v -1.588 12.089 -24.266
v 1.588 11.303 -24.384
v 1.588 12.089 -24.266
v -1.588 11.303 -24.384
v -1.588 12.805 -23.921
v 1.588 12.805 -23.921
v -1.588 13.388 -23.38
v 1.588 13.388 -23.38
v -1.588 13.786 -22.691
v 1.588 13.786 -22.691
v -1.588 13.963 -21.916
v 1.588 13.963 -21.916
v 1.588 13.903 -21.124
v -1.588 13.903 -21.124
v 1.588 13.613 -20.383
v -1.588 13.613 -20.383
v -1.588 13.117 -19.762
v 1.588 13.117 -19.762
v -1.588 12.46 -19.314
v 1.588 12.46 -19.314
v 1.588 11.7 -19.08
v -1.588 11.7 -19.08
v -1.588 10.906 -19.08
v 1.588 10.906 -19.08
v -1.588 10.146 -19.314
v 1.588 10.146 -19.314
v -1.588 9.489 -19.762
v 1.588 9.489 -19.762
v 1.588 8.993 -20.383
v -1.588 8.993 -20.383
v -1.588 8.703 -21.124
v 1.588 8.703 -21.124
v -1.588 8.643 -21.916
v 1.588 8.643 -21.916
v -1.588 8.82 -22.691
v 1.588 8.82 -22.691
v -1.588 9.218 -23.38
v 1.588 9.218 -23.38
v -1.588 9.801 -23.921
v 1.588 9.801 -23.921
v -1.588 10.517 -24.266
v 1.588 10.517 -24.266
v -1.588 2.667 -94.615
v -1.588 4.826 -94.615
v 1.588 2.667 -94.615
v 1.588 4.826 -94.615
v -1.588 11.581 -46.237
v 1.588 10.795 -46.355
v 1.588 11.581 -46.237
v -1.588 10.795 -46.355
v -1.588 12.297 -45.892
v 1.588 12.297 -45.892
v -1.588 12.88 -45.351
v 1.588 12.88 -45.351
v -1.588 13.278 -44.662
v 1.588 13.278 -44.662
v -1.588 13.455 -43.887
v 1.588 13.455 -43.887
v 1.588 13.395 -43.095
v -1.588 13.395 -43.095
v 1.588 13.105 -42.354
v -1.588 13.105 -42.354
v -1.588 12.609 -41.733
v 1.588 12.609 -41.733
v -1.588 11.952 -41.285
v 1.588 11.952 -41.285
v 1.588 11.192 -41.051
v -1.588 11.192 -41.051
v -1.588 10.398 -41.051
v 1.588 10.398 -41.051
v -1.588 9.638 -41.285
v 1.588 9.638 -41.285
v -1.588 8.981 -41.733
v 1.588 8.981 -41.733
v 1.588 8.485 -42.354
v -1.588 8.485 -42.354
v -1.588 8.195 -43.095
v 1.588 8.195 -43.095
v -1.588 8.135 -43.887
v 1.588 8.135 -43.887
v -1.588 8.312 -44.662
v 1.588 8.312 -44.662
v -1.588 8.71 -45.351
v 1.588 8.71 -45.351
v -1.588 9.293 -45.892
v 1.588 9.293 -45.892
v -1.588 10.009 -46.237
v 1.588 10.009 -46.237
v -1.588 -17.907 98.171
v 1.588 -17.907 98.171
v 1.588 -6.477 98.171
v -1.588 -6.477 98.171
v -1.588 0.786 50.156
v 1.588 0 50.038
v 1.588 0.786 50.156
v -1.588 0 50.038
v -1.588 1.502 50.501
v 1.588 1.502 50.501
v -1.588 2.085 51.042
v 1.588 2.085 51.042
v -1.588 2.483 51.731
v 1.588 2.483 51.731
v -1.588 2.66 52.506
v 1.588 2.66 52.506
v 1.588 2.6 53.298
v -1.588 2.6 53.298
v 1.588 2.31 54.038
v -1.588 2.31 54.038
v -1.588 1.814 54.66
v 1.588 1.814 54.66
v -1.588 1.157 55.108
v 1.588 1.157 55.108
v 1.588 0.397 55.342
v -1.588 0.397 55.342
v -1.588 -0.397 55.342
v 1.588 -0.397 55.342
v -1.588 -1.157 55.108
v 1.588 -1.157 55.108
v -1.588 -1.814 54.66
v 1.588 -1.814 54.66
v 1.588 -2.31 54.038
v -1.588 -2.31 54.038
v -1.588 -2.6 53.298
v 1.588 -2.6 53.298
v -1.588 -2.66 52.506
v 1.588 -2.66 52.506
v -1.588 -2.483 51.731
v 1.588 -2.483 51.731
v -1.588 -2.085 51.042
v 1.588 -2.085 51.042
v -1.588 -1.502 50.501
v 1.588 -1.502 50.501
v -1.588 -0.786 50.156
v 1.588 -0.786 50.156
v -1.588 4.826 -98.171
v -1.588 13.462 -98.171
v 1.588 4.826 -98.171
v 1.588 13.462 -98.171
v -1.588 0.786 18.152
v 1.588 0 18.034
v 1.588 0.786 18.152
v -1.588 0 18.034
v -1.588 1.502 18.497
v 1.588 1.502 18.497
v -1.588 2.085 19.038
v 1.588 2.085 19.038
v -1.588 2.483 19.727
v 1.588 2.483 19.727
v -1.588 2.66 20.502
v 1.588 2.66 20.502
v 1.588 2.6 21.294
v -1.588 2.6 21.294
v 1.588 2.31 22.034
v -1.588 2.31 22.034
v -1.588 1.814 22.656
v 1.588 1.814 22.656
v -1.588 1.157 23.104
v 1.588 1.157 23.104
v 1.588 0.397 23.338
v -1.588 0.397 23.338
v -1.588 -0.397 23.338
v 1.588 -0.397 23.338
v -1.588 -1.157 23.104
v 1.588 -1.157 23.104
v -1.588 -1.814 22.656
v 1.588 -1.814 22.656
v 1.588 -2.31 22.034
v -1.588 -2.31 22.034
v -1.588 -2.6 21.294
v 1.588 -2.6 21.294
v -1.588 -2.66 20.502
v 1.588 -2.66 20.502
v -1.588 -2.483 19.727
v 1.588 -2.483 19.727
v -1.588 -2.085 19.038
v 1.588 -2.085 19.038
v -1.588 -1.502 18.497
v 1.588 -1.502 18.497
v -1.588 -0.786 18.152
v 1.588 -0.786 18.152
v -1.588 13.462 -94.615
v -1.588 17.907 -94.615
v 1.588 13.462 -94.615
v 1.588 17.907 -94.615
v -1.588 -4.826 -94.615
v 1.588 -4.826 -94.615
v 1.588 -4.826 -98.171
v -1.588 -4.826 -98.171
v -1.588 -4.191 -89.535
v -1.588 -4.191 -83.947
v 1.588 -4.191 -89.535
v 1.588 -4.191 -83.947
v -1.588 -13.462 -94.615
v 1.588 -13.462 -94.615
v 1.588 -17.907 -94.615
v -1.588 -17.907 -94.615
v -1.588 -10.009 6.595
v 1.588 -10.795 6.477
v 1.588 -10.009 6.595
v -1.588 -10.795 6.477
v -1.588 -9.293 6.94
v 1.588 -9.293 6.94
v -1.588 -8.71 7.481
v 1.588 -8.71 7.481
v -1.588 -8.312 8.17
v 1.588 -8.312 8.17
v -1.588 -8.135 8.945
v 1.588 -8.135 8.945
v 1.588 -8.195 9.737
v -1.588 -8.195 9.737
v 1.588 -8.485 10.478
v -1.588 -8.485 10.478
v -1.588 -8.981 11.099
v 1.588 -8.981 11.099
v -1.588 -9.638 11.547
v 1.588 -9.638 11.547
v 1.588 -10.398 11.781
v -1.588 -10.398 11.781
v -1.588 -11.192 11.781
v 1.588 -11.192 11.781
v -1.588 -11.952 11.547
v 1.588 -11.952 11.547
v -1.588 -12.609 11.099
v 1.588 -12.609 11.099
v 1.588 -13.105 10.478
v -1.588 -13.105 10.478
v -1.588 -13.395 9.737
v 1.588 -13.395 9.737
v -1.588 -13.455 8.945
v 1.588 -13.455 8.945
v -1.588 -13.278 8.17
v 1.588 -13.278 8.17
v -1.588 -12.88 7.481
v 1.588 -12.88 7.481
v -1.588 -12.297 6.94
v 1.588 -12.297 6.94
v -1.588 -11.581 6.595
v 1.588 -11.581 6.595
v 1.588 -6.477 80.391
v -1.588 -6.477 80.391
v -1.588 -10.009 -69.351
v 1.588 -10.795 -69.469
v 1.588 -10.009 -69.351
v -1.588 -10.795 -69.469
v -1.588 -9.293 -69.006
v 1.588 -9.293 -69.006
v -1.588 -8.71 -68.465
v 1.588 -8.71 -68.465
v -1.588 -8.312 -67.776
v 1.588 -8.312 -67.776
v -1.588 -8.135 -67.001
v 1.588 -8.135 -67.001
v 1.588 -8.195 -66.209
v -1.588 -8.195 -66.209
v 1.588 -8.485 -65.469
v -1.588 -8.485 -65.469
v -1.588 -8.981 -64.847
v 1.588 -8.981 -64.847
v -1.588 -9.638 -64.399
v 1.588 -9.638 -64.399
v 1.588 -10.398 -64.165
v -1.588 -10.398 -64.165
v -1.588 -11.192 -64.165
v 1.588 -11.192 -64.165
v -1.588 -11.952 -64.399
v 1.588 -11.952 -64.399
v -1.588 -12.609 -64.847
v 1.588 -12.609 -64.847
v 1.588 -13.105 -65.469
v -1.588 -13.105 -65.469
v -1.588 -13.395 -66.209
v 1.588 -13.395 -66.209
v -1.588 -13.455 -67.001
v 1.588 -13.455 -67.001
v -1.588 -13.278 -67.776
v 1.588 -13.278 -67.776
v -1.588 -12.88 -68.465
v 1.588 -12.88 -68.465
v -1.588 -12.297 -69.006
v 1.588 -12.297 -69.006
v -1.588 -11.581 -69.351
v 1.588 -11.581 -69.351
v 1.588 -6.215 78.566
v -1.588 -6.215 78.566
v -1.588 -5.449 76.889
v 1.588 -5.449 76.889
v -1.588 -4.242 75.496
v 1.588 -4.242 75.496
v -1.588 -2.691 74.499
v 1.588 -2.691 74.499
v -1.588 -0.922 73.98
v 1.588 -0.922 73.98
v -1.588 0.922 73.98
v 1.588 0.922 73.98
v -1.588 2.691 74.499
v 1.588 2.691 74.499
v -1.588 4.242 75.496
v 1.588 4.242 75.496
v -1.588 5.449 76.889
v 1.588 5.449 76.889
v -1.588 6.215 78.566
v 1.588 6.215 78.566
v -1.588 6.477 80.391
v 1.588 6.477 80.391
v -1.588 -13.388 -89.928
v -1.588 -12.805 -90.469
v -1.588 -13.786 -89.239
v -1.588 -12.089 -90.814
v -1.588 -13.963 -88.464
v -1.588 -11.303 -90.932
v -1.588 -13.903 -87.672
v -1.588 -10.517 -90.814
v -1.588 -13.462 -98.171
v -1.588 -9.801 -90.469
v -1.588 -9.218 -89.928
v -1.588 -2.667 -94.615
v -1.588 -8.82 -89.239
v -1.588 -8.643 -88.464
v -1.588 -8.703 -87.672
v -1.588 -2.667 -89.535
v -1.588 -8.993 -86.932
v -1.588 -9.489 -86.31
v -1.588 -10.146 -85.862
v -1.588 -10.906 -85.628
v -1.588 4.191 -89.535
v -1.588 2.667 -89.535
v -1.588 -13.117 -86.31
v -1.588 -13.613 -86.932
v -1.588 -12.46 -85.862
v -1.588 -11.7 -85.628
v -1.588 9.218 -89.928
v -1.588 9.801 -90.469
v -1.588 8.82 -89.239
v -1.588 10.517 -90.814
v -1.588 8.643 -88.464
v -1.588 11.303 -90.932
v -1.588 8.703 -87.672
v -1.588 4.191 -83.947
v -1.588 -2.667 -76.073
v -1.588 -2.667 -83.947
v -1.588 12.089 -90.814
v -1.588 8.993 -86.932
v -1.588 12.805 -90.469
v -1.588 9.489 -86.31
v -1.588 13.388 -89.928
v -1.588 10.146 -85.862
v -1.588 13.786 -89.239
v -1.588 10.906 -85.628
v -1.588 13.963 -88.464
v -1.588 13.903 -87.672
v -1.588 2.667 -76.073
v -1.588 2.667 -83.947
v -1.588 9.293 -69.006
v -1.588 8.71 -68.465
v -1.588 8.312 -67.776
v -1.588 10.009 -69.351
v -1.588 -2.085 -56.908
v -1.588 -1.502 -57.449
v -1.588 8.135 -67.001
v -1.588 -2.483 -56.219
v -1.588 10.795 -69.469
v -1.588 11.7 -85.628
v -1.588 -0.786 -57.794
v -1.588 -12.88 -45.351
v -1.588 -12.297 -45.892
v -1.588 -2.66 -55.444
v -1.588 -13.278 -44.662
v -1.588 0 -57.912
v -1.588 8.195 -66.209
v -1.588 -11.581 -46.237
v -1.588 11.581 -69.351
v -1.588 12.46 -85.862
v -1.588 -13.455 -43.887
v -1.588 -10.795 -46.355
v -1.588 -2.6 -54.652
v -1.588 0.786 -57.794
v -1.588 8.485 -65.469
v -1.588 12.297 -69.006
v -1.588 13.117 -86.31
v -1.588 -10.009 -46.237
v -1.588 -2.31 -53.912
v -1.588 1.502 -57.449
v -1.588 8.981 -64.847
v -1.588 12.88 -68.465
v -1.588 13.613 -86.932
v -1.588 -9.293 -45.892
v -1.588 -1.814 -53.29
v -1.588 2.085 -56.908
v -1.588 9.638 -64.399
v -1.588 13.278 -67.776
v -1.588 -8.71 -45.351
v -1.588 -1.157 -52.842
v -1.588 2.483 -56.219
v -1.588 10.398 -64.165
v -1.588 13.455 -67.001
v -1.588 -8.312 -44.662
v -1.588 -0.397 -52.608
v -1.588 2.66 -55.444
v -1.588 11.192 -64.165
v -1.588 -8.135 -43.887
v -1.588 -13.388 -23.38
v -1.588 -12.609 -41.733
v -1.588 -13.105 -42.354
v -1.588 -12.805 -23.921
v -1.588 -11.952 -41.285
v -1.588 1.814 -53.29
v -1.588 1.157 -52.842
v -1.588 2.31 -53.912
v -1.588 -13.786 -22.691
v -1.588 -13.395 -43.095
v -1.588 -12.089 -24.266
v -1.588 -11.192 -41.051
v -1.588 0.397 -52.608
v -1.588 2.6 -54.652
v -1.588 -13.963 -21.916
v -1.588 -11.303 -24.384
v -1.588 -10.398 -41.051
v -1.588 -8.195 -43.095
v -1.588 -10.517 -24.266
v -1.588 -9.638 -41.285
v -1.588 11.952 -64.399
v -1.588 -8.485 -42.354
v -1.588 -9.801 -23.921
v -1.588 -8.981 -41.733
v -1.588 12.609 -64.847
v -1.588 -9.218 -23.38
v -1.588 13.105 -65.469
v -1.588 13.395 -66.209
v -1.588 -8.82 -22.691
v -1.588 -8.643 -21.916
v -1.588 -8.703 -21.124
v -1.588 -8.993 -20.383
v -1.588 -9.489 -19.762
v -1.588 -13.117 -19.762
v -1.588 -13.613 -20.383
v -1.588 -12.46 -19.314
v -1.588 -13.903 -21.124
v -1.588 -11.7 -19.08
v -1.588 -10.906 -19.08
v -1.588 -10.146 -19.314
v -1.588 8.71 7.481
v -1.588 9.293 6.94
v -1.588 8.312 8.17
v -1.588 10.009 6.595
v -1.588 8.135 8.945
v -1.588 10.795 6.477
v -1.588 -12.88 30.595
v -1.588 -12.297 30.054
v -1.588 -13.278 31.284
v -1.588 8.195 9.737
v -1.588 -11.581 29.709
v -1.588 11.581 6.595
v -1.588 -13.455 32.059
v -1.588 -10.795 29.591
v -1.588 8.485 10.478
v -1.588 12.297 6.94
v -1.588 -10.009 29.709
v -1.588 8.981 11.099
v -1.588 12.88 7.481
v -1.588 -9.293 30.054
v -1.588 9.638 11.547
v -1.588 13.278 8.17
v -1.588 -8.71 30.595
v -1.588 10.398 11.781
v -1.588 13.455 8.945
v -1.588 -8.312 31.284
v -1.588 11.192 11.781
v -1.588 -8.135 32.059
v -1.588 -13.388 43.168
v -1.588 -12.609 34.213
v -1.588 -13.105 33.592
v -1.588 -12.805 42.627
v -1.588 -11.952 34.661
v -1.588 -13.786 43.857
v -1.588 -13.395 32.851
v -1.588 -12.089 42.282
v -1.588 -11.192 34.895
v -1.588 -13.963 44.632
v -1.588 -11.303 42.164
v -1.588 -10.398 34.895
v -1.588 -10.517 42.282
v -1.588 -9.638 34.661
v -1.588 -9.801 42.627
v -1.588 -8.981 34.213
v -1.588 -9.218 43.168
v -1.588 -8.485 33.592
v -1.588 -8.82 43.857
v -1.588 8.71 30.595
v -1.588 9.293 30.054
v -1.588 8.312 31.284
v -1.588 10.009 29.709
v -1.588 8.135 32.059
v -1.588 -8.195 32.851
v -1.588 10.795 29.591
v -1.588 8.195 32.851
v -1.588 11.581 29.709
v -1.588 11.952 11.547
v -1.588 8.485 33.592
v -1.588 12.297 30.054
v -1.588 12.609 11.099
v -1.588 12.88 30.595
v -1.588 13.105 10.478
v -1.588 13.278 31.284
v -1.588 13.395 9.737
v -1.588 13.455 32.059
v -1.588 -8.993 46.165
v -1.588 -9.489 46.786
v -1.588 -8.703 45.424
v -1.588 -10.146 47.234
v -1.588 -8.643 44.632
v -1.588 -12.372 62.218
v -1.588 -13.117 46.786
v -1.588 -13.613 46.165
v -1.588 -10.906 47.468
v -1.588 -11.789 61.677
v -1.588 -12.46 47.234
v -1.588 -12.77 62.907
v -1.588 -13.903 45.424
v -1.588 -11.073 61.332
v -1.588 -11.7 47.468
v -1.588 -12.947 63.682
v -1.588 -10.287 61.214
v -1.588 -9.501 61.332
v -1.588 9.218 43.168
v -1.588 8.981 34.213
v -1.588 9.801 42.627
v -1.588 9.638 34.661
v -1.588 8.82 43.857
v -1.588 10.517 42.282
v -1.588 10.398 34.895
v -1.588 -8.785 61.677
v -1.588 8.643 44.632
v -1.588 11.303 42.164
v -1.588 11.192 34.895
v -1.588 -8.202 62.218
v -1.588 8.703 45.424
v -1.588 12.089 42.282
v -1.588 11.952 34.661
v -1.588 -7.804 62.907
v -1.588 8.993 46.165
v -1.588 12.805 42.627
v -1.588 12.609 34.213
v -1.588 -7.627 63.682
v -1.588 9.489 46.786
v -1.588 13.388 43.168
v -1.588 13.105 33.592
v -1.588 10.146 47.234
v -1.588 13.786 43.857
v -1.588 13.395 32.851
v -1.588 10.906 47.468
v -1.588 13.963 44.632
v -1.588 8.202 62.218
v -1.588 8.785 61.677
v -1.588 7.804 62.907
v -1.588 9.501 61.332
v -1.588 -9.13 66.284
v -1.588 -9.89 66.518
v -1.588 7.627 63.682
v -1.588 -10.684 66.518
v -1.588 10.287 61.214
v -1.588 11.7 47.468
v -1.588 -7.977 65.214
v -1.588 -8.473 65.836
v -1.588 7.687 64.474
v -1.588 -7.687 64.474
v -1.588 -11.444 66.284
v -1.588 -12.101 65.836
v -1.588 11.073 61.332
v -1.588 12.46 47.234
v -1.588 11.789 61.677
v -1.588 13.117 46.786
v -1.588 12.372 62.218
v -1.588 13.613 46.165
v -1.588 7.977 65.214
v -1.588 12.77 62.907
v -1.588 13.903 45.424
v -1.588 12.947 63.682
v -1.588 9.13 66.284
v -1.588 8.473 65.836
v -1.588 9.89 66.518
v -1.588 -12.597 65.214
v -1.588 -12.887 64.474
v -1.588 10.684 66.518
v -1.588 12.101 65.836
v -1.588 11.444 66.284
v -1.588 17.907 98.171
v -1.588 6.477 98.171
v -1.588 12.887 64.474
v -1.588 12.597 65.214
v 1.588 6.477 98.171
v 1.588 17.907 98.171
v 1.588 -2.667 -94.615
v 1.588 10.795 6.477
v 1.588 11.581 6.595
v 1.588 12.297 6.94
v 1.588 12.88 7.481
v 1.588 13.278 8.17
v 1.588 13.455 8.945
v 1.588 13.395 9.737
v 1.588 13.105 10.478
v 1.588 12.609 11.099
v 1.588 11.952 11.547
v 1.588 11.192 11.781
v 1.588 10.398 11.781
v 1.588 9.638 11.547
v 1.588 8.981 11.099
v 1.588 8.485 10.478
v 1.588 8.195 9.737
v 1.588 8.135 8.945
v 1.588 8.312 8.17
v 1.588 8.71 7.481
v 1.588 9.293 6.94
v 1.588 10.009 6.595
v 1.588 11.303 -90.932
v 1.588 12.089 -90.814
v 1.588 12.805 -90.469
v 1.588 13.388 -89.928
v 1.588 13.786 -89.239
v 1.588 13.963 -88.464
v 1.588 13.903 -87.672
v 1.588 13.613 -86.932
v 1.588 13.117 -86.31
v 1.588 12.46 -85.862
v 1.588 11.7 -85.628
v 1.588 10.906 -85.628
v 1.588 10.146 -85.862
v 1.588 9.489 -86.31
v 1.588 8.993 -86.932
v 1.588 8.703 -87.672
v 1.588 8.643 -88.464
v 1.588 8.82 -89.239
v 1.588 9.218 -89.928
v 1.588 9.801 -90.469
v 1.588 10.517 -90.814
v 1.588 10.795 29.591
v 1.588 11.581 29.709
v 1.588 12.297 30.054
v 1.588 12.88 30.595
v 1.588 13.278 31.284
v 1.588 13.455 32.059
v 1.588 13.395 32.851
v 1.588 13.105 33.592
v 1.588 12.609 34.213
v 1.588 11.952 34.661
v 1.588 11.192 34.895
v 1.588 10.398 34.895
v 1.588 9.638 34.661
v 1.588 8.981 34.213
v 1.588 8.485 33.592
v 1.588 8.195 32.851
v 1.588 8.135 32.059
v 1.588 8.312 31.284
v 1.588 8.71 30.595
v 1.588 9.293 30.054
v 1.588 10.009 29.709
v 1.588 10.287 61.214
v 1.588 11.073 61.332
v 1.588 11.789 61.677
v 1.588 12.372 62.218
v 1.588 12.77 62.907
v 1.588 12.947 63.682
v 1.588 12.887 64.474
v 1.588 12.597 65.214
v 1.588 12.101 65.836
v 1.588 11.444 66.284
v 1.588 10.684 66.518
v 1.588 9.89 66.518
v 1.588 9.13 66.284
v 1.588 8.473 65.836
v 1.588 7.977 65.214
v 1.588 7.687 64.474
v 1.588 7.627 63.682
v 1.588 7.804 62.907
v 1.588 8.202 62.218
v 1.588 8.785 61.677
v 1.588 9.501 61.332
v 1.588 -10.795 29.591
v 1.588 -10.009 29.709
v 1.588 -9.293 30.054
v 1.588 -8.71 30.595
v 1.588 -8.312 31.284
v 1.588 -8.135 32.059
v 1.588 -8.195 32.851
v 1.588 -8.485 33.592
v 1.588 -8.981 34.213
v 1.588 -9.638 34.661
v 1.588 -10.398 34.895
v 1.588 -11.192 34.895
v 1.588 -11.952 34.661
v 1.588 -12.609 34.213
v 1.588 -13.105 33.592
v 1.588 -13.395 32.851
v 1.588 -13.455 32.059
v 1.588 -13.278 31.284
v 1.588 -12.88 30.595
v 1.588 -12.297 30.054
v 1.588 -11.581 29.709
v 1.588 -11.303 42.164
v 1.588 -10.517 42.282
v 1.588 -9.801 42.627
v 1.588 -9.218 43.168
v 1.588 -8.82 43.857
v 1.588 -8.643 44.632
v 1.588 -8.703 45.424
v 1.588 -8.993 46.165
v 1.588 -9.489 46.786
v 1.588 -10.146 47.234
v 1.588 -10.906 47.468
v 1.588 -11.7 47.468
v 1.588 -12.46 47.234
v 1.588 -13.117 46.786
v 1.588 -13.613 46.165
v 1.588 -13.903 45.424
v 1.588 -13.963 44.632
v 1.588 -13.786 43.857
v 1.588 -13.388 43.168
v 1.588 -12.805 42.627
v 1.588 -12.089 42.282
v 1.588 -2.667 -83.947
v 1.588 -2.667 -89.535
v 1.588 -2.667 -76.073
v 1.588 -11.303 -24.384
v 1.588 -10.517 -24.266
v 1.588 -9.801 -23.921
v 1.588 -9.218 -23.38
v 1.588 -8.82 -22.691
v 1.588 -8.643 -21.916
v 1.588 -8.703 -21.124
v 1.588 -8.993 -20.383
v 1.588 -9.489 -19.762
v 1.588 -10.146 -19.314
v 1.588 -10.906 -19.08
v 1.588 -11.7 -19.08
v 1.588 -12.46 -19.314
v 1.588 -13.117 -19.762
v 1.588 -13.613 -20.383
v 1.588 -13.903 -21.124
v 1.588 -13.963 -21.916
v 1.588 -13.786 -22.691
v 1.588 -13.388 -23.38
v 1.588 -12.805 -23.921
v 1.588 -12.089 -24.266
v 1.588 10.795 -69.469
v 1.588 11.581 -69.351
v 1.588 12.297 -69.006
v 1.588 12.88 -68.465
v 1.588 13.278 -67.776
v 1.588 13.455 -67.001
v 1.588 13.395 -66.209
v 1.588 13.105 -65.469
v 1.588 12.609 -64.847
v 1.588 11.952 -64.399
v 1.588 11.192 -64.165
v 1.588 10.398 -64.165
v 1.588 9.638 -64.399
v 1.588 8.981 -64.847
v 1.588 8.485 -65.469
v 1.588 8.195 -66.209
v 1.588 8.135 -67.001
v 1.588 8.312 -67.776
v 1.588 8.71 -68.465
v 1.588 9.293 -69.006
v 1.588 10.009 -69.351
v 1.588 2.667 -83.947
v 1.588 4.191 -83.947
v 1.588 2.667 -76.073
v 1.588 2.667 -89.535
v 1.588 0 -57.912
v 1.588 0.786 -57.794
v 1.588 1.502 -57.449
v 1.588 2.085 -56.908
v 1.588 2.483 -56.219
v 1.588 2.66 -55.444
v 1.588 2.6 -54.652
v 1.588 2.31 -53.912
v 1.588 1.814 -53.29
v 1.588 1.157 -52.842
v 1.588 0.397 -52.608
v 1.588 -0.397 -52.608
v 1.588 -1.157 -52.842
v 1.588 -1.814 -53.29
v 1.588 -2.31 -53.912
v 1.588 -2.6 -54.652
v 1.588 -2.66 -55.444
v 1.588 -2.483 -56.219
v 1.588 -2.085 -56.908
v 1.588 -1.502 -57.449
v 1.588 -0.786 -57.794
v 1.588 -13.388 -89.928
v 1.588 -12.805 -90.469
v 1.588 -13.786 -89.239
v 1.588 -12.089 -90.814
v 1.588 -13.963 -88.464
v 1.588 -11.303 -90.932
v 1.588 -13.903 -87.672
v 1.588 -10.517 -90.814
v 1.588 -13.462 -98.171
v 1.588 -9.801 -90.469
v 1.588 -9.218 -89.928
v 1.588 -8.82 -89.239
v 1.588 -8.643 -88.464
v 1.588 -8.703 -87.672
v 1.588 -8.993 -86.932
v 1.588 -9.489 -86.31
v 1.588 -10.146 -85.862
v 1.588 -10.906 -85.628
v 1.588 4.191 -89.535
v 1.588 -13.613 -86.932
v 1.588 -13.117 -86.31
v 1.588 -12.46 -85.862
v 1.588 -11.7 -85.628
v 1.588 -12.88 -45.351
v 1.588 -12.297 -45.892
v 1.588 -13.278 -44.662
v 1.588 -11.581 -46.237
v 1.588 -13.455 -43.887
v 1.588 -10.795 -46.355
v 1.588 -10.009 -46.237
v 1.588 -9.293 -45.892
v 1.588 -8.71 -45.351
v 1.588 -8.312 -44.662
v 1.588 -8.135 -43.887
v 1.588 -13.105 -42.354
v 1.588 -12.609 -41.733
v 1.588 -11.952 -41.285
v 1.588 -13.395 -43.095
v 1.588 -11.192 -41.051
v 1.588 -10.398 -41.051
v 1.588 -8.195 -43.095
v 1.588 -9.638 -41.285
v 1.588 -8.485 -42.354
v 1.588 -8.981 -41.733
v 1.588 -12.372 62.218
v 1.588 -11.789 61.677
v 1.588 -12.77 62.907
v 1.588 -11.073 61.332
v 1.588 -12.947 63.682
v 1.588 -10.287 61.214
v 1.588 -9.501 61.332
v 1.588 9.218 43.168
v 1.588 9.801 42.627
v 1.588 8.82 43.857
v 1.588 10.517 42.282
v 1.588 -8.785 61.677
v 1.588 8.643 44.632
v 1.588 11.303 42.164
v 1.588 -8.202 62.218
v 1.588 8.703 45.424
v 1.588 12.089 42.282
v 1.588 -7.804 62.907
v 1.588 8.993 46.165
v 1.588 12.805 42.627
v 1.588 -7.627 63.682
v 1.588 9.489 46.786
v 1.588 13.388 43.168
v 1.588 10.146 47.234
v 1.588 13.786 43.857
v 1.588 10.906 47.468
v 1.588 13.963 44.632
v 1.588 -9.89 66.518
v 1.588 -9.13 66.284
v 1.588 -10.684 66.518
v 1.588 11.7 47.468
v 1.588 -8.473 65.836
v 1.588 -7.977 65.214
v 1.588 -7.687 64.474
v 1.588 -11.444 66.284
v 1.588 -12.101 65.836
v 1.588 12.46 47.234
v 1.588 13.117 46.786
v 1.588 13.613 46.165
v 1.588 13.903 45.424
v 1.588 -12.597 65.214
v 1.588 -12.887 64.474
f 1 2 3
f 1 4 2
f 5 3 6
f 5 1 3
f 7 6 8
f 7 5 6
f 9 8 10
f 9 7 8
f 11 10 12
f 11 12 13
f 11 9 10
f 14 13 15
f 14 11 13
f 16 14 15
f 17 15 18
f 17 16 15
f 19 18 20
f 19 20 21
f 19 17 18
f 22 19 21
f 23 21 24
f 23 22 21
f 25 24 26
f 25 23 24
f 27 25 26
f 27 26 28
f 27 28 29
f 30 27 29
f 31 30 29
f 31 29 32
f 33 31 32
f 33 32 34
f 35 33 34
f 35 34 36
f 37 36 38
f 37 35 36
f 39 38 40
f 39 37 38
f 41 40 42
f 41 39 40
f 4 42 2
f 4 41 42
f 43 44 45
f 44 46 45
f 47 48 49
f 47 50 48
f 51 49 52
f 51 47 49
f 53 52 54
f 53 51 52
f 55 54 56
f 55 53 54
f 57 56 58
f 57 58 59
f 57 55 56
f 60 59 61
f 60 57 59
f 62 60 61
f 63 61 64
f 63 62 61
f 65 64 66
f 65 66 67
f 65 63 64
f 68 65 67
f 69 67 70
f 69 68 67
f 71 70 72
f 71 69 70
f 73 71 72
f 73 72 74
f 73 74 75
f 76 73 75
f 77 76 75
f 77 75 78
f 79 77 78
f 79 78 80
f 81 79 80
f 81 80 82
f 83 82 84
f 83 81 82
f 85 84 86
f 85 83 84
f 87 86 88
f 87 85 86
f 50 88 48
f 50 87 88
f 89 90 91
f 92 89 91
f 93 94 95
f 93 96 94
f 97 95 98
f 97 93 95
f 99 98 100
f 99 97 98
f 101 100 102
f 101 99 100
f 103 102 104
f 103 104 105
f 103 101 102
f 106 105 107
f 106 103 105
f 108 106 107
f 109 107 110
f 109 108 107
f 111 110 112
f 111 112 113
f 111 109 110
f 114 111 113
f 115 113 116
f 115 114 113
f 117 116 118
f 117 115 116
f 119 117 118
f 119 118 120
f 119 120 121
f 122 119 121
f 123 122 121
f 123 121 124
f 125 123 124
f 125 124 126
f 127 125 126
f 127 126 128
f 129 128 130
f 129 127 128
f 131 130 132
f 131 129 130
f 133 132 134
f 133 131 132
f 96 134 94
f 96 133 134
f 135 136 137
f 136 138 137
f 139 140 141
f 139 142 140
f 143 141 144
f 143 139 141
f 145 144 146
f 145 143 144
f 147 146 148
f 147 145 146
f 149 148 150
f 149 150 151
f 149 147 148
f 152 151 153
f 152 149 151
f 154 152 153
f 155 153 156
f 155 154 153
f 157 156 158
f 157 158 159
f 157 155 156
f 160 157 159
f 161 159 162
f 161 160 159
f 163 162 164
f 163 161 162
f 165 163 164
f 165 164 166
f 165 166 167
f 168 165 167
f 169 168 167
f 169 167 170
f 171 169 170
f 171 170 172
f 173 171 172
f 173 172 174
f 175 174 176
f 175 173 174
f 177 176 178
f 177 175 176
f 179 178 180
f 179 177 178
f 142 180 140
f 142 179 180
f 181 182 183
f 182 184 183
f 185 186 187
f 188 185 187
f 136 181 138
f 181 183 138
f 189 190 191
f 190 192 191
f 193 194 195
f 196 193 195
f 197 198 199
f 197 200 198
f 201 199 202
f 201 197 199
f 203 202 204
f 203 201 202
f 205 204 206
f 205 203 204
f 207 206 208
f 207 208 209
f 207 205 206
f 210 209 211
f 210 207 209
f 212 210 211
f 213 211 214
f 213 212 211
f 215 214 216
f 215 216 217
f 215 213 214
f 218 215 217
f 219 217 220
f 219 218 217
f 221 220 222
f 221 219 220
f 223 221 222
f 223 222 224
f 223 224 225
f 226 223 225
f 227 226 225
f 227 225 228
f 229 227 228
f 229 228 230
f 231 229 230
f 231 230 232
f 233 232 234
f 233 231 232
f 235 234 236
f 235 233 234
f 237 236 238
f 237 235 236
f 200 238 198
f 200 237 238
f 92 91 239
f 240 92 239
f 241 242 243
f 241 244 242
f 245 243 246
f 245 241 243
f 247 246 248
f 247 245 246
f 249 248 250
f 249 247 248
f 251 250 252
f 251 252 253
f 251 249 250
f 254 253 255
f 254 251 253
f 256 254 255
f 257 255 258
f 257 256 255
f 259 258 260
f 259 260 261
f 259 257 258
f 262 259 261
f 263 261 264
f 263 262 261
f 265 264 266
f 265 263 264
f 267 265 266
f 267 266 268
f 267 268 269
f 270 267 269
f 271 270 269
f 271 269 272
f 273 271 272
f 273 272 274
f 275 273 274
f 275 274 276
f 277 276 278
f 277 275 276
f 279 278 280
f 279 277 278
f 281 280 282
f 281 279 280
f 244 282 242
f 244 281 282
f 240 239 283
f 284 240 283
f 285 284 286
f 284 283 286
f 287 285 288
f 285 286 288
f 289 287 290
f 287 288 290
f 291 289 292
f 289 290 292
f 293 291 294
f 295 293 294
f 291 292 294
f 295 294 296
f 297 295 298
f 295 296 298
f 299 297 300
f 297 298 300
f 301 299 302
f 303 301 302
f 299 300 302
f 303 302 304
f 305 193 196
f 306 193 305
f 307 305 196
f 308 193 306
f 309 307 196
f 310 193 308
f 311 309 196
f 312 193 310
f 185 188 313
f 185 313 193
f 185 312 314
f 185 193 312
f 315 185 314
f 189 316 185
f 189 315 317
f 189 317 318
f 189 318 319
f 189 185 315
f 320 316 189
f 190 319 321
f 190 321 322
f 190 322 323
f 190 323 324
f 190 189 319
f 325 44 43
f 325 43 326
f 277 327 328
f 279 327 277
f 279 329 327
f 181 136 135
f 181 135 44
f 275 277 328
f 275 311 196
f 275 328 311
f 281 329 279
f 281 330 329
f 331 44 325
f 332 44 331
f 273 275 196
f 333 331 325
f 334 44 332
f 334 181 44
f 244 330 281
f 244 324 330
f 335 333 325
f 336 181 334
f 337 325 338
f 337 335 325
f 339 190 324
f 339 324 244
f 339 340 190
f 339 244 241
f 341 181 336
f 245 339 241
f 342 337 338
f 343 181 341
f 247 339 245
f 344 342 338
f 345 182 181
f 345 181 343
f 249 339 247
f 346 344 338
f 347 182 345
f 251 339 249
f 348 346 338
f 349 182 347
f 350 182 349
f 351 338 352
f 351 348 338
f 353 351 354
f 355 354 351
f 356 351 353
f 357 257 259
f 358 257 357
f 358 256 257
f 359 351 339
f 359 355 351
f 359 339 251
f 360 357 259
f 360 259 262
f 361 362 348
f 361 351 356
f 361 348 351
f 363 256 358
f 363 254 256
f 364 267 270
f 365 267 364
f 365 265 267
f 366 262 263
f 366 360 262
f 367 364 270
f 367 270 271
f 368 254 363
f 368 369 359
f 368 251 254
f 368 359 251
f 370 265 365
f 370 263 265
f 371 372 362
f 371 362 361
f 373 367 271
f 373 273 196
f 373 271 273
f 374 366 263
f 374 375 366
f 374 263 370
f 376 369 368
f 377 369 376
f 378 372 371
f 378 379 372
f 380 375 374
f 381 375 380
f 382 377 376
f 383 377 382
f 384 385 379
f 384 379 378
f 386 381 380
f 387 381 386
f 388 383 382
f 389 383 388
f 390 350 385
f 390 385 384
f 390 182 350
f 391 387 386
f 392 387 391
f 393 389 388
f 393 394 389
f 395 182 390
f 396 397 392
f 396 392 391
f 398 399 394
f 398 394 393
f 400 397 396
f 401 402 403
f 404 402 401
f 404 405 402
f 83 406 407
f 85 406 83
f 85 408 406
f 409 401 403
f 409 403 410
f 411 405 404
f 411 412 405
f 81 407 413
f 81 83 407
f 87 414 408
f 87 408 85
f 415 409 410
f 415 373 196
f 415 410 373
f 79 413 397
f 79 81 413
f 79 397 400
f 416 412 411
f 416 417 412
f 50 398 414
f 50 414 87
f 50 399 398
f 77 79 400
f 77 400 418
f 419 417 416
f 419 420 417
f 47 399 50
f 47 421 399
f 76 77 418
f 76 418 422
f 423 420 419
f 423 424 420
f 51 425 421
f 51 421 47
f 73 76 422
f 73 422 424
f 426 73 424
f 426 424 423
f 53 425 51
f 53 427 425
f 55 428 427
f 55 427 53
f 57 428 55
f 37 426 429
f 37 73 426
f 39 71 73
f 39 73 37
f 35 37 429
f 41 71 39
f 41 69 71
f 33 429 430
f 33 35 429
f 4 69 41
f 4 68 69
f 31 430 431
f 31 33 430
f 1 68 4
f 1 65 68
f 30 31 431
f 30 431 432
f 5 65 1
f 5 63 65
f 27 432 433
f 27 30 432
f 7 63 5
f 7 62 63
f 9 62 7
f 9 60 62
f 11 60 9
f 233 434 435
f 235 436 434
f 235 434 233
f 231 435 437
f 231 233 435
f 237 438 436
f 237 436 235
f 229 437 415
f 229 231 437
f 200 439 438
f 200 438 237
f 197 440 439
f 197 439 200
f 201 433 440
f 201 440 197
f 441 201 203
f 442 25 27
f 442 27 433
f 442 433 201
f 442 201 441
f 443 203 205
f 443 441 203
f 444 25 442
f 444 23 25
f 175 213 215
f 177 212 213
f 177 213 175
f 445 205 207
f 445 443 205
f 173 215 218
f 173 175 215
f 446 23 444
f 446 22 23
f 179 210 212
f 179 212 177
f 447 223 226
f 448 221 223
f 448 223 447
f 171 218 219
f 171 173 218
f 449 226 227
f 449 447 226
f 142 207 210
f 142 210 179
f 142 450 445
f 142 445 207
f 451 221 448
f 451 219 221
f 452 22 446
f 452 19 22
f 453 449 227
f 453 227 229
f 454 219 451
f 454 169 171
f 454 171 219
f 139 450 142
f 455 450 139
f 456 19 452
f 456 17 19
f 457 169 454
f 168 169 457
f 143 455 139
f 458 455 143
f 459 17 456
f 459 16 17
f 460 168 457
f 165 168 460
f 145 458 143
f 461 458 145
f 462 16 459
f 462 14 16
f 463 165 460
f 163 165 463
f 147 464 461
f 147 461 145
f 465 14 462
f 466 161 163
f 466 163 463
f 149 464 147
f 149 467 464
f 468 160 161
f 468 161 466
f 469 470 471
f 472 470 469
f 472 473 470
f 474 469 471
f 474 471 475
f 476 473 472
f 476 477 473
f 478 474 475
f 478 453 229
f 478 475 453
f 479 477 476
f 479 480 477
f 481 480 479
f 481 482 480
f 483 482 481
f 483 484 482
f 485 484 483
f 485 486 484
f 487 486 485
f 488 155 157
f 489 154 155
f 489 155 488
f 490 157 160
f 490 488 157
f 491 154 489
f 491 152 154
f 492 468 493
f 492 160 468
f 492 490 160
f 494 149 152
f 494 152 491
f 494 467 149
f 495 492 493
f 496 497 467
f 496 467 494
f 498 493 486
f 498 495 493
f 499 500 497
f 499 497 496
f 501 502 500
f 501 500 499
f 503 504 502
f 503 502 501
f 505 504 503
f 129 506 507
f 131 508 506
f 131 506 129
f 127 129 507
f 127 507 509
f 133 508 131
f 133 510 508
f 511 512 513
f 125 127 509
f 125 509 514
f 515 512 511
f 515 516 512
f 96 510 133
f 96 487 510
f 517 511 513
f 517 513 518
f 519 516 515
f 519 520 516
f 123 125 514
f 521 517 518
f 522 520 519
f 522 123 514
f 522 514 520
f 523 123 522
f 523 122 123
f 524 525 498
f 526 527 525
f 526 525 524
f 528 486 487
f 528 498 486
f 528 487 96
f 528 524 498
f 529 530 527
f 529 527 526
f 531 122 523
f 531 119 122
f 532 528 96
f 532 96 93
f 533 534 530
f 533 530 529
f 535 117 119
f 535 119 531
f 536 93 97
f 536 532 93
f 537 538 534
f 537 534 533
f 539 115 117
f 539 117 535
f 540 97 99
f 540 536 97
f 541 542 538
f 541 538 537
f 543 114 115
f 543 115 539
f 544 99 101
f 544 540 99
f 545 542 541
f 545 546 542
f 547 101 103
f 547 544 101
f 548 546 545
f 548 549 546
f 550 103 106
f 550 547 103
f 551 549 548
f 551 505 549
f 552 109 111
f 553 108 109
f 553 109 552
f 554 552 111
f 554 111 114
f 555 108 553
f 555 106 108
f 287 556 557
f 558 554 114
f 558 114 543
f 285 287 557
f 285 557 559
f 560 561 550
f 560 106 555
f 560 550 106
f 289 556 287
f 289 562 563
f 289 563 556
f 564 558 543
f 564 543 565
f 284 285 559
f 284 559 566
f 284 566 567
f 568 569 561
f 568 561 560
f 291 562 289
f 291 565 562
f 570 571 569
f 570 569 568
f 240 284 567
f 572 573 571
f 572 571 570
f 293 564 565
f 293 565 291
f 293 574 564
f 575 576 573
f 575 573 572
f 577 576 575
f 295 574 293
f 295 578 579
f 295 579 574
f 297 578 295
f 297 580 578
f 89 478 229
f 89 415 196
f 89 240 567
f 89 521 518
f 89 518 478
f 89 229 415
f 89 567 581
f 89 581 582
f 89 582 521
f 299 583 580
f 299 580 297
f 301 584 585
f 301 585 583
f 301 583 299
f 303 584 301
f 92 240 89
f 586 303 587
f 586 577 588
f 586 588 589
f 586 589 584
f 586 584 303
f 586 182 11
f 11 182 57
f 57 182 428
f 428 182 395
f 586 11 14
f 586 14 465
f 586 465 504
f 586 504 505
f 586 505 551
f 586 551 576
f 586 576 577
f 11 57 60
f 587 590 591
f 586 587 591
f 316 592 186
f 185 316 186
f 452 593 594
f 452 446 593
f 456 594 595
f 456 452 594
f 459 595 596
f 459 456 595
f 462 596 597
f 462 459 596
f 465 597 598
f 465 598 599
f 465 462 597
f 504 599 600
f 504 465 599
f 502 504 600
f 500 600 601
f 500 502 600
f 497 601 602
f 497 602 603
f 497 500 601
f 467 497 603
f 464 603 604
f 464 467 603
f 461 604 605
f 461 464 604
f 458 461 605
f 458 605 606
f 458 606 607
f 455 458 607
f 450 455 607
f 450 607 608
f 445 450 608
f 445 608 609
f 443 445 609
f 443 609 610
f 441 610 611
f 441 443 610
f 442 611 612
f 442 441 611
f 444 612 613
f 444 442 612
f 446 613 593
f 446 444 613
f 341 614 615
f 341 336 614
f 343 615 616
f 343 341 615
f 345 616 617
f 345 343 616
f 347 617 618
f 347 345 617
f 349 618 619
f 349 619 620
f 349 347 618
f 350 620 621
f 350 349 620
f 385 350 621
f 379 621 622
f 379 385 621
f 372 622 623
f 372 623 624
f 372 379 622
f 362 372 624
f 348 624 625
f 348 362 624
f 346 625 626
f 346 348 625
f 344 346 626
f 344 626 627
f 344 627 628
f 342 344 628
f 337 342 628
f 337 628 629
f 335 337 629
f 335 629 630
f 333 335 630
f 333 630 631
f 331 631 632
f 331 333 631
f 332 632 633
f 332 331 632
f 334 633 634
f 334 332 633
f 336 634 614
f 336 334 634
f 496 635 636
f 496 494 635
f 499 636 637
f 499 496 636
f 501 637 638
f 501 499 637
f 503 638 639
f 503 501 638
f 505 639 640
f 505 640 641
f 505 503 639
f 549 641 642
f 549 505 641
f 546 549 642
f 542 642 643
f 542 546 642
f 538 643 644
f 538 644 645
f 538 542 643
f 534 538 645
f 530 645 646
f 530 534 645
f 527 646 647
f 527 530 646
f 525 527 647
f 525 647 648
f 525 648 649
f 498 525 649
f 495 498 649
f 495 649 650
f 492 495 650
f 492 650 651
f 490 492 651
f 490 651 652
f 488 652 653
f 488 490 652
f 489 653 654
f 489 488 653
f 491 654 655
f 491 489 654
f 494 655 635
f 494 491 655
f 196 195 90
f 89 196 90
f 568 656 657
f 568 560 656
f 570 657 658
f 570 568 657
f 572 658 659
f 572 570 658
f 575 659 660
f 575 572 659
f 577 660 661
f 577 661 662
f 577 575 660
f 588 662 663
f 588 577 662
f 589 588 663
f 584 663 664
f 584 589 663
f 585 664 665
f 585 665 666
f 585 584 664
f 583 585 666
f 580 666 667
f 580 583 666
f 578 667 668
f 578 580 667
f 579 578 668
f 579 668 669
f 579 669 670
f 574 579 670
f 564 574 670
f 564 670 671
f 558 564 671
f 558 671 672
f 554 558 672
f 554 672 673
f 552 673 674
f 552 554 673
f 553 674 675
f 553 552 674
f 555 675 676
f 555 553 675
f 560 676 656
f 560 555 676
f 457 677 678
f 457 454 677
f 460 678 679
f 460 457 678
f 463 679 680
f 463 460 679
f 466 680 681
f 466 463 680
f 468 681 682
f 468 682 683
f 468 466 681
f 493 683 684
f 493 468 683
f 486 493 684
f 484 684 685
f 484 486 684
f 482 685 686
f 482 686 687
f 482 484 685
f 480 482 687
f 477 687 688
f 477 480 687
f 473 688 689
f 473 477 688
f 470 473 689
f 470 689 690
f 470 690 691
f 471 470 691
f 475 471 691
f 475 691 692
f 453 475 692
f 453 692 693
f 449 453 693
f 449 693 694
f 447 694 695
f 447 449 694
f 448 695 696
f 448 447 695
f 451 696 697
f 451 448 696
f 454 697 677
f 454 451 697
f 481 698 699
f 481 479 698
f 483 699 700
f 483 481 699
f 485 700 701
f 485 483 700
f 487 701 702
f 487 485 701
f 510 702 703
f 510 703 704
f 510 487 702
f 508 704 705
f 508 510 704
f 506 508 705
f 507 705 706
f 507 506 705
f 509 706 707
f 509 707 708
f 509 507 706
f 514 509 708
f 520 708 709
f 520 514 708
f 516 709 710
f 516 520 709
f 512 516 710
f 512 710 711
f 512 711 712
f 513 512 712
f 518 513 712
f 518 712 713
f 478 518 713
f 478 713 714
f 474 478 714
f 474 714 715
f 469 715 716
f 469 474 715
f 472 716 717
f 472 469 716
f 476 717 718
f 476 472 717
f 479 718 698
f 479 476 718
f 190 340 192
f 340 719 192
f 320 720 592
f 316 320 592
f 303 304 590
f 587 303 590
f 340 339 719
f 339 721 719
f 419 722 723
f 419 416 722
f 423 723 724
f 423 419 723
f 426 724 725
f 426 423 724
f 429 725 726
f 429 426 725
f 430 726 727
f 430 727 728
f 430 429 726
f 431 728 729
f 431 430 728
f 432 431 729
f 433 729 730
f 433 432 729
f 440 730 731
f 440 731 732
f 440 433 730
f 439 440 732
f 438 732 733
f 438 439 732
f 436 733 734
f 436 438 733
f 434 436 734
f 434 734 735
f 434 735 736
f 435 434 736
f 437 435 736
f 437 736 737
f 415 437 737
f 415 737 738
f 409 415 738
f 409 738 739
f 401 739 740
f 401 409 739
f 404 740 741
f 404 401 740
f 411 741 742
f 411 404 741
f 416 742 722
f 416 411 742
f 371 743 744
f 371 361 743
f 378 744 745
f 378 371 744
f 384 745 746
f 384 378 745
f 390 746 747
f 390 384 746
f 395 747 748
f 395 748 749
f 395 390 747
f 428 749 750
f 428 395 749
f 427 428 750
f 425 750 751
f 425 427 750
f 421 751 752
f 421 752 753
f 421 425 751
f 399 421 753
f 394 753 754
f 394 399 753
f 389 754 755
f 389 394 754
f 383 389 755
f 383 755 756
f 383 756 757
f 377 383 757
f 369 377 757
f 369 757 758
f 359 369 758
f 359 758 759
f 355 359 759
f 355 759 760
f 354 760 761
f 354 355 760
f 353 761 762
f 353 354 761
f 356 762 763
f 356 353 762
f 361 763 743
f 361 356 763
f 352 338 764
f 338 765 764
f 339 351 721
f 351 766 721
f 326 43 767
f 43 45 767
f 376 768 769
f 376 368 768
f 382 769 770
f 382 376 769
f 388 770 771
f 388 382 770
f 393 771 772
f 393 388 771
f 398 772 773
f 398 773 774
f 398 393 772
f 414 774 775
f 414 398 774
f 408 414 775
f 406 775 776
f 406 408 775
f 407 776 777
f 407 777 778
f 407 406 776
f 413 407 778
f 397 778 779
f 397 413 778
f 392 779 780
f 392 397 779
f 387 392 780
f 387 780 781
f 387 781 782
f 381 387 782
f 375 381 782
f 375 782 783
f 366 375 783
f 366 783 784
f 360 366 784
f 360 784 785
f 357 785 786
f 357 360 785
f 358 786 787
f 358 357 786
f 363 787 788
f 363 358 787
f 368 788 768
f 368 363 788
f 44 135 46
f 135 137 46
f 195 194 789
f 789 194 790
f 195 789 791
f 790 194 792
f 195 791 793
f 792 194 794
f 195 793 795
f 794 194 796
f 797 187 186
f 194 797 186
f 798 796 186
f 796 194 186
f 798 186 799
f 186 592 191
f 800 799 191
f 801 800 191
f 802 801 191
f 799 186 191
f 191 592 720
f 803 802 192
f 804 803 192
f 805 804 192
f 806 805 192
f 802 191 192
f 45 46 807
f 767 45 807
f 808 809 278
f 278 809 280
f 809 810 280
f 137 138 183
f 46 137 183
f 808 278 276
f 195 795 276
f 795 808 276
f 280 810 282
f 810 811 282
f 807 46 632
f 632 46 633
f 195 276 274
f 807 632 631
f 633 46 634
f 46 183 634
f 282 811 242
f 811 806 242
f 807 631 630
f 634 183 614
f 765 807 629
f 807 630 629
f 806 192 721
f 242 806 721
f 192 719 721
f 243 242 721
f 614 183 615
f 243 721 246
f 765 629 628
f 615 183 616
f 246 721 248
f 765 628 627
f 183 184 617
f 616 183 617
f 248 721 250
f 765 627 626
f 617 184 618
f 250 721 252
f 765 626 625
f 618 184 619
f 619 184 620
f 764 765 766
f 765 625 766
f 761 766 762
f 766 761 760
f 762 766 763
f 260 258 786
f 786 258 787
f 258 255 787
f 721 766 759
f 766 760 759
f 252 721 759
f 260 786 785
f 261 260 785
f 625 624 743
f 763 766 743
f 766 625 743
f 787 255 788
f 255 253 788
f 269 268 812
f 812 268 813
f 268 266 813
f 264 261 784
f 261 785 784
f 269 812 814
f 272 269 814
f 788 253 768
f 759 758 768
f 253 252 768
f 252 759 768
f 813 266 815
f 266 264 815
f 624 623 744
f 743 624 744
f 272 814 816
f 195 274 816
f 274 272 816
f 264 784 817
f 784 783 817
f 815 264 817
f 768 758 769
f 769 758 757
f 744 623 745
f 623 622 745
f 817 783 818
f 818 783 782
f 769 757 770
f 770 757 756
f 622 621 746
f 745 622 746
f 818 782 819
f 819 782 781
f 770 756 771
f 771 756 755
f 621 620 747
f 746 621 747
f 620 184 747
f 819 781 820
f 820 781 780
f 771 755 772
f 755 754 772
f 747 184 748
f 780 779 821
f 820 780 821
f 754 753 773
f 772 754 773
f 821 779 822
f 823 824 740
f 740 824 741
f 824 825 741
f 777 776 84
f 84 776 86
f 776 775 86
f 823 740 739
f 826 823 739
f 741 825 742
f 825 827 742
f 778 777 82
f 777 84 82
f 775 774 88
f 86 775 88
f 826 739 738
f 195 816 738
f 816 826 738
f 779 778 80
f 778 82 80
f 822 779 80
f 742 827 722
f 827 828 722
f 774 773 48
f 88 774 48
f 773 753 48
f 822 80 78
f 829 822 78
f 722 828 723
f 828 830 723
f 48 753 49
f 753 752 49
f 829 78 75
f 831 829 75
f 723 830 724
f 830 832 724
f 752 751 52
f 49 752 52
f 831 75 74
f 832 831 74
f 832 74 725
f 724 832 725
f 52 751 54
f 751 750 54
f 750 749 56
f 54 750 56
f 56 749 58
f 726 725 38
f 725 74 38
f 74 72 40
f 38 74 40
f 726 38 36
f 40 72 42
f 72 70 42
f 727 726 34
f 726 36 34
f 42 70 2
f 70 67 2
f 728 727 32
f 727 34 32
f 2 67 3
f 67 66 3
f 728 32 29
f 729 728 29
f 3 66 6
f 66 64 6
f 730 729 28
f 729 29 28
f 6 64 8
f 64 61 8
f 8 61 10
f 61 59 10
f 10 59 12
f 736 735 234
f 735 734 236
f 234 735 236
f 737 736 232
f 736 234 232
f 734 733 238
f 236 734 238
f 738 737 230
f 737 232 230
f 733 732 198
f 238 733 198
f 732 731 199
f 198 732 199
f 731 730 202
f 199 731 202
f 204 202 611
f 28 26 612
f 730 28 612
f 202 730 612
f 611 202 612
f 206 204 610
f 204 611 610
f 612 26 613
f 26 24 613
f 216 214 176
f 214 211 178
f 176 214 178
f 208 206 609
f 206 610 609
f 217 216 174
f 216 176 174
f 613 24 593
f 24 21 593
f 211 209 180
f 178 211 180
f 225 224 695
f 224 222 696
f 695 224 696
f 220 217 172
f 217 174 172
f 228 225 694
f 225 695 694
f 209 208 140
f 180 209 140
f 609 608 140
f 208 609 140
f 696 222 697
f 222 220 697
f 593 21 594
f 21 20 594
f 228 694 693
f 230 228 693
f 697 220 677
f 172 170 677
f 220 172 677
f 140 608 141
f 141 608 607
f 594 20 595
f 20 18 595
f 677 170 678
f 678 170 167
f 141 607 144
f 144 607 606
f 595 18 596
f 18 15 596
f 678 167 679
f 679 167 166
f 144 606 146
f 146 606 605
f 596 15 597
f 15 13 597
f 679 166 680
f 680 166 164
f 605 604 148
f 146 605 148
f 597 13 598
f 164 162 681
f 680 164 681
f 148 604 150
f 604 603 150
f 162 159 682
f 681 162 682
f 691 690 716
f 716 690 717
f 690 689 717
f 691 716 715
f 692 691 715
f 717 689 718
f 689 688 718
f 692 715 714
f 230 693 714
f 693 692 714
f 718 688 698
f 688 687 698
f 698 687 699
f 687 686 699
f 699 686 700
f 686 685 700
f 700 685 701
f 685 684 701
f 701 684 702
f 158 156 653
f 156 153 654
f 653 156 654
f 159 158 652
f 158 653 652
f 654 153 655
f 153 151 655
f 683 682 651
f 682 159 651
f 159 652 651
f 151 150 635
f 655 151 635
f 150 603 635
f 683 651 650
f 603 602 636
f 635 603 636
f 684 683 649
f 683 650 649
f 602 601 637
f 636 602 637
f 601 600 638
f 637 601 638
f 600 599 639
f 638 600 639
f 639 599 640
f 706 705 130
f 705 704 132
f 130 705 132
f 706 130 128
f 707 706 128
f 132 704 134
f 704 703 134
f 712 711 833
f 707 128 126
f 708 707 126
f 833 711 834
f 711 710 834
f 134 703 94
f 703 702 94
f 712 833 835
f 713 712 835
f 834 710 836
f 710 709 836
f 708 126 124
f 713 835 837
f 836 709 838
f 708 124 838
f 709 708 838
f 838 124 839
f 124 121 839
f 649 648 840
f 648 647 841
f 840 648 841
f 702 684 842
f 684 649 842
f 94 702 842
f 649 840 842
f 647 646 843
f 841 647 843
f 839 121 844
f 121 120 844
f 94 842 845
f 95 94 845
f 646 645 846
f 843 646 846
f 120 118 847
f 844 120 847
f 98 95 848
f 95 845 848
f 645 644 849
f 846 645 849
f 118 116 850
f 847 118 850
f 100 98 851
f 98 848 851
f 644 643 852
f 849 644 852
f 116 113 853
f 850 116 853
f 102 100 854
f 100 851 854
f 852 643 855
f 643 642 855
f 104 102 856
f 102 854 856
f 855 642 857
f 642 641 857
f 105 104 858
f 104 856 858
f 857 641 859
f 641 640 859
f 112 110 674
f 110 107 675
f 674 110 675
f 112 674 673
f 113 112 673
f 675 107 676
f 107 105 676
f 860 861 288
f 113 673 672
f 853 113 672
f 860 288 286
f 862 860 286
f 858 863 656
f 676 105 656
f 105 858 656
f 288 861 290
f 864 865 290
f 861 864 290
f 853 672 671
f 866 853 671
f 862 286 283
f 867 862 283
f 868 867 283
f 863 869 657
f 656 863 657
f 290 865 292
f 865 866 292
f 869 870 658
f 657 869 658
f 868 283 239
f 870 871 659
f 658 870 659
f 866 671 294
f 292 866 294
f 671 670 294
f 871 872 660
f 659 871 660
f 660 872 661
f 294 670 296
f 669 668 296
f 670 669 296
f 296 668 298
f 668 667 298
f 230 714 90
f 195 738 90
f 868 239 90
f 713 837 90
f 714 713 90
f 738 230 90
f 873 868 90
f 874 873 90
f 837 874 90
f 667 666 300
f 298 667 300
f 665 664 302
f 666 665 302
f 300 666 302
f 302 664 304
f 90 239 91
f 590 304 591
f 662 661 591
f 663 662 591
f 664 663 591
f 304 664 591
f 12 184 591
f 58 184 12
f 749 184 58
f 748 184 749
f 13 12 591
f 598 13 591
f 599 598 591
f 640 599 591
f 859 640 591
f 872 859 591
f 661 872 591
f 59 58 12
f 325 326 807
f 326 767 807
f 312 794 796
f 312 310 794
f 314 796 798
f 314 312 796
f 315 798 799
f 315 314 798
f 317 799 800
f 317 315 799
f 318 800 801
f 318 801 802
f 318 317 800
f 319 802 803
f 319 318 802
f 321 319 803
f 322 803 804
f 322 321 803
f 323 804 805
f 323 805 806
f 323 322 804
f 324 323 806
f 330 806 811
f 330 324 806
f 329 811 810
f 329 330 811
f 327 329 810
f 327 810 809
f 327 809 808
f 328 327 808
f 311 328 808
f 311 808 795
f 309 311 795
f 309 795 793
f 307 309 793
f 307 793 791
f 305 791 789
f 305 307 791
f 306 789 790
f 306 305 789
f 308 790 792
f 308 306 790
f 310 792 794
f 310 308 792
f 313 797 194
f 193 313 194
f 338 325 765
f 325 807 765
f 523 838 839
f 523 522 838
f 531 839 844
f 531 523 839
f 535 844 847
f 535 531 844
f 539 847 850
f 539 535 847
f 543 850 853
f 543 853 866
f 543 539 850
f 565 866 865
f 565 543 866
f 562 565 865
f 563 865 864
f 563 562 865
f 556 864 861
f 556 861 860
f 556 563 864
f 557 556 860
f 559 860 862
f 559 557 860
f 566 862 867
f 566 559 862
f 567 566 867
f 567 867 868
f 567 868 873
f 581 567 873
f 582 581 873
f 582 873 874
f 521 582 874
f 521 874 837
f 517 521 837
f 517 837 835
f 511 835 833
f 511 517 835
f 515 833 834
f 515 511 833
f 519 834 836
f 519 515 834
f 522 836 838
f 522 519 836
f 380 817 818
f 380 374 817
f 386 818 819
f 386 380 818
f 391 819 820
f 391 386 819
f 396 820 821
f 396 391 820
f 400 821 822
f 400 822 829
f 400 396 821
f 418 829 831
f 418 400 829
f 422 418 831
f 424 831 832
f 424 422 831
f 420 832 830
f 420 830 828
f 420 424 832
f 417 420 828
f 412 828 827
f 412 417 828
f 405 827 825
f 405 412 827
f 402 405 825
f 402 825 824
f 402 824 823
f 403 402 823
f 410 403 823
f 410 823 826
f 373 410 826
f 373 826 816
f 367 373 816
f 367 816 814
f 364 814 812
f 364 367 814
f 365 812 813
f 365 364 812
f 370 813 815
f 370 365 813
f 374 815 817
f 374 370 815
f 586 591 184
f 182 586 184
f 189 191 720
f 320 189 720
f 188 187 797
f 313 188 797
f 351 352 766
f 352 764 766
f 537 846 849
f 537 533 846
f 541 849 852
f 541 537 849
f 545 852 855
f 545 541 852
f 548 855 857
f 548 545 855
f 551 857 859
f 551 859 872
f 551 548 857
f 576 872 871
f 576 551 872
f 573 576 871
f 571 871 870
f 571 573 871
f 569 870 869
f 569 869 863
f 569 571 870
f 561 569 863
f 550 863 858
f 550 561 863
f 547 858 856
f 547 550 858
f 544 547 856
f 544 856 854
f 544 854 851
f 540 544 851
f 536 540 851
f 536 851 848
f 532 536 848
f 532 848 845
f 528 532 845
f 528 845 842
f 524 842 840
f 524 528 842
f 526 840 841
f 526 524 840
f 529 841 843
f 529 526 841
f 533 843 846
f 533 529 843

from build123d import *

# Parameters (mm, degrees)
SKETCH1_R           = 2.667
BOSS_EXTRUDE1_DEPTH = 1.5875


with BuildPart() as part:
    # Sketch1 → Boss-Extrude1 (new body, symmetric)
    with BuildSketch(Plane(origin=(0, 0, 0), x_dir=(0, 0, -1), z_dir=(1, 0, 0))):
        with BuildLine():
            Line((-98.171, 17.907), (94.615, 17.907))
            Line((94.615, 17.907), (94.615, 13.462))
            Line((94.615, 13.462), (98.171, 13.462))
            Line((98.171, 13.462), (98.171, 4.826))
            Line((98.171, 4.826), (94.615, 4.826))
            Line((94.615, 4.826), (94.615, 2.667))
            Line((94.615, 2.667), (89.535, 2.667))
            Line((89.535, 2.667), (89.535, 4.191))
            Line((89.535, 4.191), (83.947, 4.191))
            Line((83.947, 4.191), (83.947, 2.667))
            Line((83.947, 2.667), (76.073, 2.667))
            Line((76.073, 2.667), (76.073, -2.667))
            Line((76.073, -2.667), (83.947, -2.667))
            Line((83.947, -2.667), (83.947, -4.191))
            Line((83.947, -4.191), (89.535, -4.191))
            Line((89.535, -4.191), (89.535, -2.667))
            Line((89.535, -2.667), (94.615, -2.667))
            Line((94.615, -2.667), (94.615, -4.826))
            Line((94.615, -4.826), (98.171, -4.826))
            Line((98.171, -4.826), (98.171, -13.462))
            Line((98.171, -13.462), (94.615, -13.462))
            Line((94.615, -13.462), (94.615, -17.907))
            Line((94.615, -17.907), (-98.171, -17.907))
            Line((-98.171, -17.907), (-98.171, -6.477))
            Line((-98.171, -6.477), (-80.391, -6.477))
            ThreePointArc((-80.391, -6.477), (-73.914, 0), (-80.391, 6.477))
            Line((-80.391, 6.477), (-98.171, 6.477))
            Line((-98.171, 6.477), (-98.171, 17.907))
        make_face()
        with Locations((-63.881, 10.287)):
            Circle(SKETCH1_R, mode=Mode.SUBTRACT)
        with Locations((-63.881, -10.287)):
            Circle(SKETCH1_R, mode=Mode.SUBTRACT)
        with Locations((-52.705, 0)):
            Circle(SKETCH1_R, mode=Mode.SUBTRACT)
        with Locations((-44.831, 11.303)):
            Circle(SKETCH1_R, mode=Mode.SUBTRACT)
        with Locations((21.717, 11.303)):
            Circle(SKETCH1_R, mode=Mode.SUBTRACT)
        with Locations((88.265, 11.303)):
            Circle(SKETCH1_R, mode=Mode.SUBTRACT)
        with Locations((88.265, -11.303)):
            Circle(SKETCH1_R, mode=Mode.SUBTRACT)
        with Locations((21.717, -11.303)):
            Circle(SKETCH1_R, mode=Mode.SUBTRACT)
        with Locations((-44.831, -11.303)):
            Circle(SKETCH1_R, mode=Mode.SUBTRACT)
        with Locations((-9.144, 10.795)):
            Circle(SKETCH1_R, mode=Mode.SUBTRACT)
        with Locations((-32.258, 10.795)):
            Circle(SKETCH1_R, mode=Mode.SUBTRACT)
        with Locations((66.802, 10.795)):
            Circle(SKETCH1_R, mode=Mode.SUBTRACT)
        with Locations((43.688, 10.795)):
            Circle(SKETCH1_R, mode=Mode.SUBTRACT)
        with Locations((43.688, -10.795)):
            Circle(SKETCH1_R, mode=Mode.SUBTRACT)
        with Locations((66.802, -10.795)):
            Circle(SKETCH1_R, mode=Mode.SUBTRACT)
        with Locations((-32.258, -10.795)):
            Circle(SKETCH1_R, mode=Mode.SUBTRACT)
        with Locations((-9.144, -10.795)):
            Circle(SKETCH1_R, mode=Mode.SUBTRACT)
        with Locations((-20.701, 0)):
            Circle(SKETCH1_R, mode=Mode.SUBTRACT)
        with Locations((55.245, 0)):
            Circle(SKETCH1_R, mode=Mode.SUBTRACT)
    extrude(amount=BOSS_EXTRUDE1_DEPTH, both=True)


solid = part.part
